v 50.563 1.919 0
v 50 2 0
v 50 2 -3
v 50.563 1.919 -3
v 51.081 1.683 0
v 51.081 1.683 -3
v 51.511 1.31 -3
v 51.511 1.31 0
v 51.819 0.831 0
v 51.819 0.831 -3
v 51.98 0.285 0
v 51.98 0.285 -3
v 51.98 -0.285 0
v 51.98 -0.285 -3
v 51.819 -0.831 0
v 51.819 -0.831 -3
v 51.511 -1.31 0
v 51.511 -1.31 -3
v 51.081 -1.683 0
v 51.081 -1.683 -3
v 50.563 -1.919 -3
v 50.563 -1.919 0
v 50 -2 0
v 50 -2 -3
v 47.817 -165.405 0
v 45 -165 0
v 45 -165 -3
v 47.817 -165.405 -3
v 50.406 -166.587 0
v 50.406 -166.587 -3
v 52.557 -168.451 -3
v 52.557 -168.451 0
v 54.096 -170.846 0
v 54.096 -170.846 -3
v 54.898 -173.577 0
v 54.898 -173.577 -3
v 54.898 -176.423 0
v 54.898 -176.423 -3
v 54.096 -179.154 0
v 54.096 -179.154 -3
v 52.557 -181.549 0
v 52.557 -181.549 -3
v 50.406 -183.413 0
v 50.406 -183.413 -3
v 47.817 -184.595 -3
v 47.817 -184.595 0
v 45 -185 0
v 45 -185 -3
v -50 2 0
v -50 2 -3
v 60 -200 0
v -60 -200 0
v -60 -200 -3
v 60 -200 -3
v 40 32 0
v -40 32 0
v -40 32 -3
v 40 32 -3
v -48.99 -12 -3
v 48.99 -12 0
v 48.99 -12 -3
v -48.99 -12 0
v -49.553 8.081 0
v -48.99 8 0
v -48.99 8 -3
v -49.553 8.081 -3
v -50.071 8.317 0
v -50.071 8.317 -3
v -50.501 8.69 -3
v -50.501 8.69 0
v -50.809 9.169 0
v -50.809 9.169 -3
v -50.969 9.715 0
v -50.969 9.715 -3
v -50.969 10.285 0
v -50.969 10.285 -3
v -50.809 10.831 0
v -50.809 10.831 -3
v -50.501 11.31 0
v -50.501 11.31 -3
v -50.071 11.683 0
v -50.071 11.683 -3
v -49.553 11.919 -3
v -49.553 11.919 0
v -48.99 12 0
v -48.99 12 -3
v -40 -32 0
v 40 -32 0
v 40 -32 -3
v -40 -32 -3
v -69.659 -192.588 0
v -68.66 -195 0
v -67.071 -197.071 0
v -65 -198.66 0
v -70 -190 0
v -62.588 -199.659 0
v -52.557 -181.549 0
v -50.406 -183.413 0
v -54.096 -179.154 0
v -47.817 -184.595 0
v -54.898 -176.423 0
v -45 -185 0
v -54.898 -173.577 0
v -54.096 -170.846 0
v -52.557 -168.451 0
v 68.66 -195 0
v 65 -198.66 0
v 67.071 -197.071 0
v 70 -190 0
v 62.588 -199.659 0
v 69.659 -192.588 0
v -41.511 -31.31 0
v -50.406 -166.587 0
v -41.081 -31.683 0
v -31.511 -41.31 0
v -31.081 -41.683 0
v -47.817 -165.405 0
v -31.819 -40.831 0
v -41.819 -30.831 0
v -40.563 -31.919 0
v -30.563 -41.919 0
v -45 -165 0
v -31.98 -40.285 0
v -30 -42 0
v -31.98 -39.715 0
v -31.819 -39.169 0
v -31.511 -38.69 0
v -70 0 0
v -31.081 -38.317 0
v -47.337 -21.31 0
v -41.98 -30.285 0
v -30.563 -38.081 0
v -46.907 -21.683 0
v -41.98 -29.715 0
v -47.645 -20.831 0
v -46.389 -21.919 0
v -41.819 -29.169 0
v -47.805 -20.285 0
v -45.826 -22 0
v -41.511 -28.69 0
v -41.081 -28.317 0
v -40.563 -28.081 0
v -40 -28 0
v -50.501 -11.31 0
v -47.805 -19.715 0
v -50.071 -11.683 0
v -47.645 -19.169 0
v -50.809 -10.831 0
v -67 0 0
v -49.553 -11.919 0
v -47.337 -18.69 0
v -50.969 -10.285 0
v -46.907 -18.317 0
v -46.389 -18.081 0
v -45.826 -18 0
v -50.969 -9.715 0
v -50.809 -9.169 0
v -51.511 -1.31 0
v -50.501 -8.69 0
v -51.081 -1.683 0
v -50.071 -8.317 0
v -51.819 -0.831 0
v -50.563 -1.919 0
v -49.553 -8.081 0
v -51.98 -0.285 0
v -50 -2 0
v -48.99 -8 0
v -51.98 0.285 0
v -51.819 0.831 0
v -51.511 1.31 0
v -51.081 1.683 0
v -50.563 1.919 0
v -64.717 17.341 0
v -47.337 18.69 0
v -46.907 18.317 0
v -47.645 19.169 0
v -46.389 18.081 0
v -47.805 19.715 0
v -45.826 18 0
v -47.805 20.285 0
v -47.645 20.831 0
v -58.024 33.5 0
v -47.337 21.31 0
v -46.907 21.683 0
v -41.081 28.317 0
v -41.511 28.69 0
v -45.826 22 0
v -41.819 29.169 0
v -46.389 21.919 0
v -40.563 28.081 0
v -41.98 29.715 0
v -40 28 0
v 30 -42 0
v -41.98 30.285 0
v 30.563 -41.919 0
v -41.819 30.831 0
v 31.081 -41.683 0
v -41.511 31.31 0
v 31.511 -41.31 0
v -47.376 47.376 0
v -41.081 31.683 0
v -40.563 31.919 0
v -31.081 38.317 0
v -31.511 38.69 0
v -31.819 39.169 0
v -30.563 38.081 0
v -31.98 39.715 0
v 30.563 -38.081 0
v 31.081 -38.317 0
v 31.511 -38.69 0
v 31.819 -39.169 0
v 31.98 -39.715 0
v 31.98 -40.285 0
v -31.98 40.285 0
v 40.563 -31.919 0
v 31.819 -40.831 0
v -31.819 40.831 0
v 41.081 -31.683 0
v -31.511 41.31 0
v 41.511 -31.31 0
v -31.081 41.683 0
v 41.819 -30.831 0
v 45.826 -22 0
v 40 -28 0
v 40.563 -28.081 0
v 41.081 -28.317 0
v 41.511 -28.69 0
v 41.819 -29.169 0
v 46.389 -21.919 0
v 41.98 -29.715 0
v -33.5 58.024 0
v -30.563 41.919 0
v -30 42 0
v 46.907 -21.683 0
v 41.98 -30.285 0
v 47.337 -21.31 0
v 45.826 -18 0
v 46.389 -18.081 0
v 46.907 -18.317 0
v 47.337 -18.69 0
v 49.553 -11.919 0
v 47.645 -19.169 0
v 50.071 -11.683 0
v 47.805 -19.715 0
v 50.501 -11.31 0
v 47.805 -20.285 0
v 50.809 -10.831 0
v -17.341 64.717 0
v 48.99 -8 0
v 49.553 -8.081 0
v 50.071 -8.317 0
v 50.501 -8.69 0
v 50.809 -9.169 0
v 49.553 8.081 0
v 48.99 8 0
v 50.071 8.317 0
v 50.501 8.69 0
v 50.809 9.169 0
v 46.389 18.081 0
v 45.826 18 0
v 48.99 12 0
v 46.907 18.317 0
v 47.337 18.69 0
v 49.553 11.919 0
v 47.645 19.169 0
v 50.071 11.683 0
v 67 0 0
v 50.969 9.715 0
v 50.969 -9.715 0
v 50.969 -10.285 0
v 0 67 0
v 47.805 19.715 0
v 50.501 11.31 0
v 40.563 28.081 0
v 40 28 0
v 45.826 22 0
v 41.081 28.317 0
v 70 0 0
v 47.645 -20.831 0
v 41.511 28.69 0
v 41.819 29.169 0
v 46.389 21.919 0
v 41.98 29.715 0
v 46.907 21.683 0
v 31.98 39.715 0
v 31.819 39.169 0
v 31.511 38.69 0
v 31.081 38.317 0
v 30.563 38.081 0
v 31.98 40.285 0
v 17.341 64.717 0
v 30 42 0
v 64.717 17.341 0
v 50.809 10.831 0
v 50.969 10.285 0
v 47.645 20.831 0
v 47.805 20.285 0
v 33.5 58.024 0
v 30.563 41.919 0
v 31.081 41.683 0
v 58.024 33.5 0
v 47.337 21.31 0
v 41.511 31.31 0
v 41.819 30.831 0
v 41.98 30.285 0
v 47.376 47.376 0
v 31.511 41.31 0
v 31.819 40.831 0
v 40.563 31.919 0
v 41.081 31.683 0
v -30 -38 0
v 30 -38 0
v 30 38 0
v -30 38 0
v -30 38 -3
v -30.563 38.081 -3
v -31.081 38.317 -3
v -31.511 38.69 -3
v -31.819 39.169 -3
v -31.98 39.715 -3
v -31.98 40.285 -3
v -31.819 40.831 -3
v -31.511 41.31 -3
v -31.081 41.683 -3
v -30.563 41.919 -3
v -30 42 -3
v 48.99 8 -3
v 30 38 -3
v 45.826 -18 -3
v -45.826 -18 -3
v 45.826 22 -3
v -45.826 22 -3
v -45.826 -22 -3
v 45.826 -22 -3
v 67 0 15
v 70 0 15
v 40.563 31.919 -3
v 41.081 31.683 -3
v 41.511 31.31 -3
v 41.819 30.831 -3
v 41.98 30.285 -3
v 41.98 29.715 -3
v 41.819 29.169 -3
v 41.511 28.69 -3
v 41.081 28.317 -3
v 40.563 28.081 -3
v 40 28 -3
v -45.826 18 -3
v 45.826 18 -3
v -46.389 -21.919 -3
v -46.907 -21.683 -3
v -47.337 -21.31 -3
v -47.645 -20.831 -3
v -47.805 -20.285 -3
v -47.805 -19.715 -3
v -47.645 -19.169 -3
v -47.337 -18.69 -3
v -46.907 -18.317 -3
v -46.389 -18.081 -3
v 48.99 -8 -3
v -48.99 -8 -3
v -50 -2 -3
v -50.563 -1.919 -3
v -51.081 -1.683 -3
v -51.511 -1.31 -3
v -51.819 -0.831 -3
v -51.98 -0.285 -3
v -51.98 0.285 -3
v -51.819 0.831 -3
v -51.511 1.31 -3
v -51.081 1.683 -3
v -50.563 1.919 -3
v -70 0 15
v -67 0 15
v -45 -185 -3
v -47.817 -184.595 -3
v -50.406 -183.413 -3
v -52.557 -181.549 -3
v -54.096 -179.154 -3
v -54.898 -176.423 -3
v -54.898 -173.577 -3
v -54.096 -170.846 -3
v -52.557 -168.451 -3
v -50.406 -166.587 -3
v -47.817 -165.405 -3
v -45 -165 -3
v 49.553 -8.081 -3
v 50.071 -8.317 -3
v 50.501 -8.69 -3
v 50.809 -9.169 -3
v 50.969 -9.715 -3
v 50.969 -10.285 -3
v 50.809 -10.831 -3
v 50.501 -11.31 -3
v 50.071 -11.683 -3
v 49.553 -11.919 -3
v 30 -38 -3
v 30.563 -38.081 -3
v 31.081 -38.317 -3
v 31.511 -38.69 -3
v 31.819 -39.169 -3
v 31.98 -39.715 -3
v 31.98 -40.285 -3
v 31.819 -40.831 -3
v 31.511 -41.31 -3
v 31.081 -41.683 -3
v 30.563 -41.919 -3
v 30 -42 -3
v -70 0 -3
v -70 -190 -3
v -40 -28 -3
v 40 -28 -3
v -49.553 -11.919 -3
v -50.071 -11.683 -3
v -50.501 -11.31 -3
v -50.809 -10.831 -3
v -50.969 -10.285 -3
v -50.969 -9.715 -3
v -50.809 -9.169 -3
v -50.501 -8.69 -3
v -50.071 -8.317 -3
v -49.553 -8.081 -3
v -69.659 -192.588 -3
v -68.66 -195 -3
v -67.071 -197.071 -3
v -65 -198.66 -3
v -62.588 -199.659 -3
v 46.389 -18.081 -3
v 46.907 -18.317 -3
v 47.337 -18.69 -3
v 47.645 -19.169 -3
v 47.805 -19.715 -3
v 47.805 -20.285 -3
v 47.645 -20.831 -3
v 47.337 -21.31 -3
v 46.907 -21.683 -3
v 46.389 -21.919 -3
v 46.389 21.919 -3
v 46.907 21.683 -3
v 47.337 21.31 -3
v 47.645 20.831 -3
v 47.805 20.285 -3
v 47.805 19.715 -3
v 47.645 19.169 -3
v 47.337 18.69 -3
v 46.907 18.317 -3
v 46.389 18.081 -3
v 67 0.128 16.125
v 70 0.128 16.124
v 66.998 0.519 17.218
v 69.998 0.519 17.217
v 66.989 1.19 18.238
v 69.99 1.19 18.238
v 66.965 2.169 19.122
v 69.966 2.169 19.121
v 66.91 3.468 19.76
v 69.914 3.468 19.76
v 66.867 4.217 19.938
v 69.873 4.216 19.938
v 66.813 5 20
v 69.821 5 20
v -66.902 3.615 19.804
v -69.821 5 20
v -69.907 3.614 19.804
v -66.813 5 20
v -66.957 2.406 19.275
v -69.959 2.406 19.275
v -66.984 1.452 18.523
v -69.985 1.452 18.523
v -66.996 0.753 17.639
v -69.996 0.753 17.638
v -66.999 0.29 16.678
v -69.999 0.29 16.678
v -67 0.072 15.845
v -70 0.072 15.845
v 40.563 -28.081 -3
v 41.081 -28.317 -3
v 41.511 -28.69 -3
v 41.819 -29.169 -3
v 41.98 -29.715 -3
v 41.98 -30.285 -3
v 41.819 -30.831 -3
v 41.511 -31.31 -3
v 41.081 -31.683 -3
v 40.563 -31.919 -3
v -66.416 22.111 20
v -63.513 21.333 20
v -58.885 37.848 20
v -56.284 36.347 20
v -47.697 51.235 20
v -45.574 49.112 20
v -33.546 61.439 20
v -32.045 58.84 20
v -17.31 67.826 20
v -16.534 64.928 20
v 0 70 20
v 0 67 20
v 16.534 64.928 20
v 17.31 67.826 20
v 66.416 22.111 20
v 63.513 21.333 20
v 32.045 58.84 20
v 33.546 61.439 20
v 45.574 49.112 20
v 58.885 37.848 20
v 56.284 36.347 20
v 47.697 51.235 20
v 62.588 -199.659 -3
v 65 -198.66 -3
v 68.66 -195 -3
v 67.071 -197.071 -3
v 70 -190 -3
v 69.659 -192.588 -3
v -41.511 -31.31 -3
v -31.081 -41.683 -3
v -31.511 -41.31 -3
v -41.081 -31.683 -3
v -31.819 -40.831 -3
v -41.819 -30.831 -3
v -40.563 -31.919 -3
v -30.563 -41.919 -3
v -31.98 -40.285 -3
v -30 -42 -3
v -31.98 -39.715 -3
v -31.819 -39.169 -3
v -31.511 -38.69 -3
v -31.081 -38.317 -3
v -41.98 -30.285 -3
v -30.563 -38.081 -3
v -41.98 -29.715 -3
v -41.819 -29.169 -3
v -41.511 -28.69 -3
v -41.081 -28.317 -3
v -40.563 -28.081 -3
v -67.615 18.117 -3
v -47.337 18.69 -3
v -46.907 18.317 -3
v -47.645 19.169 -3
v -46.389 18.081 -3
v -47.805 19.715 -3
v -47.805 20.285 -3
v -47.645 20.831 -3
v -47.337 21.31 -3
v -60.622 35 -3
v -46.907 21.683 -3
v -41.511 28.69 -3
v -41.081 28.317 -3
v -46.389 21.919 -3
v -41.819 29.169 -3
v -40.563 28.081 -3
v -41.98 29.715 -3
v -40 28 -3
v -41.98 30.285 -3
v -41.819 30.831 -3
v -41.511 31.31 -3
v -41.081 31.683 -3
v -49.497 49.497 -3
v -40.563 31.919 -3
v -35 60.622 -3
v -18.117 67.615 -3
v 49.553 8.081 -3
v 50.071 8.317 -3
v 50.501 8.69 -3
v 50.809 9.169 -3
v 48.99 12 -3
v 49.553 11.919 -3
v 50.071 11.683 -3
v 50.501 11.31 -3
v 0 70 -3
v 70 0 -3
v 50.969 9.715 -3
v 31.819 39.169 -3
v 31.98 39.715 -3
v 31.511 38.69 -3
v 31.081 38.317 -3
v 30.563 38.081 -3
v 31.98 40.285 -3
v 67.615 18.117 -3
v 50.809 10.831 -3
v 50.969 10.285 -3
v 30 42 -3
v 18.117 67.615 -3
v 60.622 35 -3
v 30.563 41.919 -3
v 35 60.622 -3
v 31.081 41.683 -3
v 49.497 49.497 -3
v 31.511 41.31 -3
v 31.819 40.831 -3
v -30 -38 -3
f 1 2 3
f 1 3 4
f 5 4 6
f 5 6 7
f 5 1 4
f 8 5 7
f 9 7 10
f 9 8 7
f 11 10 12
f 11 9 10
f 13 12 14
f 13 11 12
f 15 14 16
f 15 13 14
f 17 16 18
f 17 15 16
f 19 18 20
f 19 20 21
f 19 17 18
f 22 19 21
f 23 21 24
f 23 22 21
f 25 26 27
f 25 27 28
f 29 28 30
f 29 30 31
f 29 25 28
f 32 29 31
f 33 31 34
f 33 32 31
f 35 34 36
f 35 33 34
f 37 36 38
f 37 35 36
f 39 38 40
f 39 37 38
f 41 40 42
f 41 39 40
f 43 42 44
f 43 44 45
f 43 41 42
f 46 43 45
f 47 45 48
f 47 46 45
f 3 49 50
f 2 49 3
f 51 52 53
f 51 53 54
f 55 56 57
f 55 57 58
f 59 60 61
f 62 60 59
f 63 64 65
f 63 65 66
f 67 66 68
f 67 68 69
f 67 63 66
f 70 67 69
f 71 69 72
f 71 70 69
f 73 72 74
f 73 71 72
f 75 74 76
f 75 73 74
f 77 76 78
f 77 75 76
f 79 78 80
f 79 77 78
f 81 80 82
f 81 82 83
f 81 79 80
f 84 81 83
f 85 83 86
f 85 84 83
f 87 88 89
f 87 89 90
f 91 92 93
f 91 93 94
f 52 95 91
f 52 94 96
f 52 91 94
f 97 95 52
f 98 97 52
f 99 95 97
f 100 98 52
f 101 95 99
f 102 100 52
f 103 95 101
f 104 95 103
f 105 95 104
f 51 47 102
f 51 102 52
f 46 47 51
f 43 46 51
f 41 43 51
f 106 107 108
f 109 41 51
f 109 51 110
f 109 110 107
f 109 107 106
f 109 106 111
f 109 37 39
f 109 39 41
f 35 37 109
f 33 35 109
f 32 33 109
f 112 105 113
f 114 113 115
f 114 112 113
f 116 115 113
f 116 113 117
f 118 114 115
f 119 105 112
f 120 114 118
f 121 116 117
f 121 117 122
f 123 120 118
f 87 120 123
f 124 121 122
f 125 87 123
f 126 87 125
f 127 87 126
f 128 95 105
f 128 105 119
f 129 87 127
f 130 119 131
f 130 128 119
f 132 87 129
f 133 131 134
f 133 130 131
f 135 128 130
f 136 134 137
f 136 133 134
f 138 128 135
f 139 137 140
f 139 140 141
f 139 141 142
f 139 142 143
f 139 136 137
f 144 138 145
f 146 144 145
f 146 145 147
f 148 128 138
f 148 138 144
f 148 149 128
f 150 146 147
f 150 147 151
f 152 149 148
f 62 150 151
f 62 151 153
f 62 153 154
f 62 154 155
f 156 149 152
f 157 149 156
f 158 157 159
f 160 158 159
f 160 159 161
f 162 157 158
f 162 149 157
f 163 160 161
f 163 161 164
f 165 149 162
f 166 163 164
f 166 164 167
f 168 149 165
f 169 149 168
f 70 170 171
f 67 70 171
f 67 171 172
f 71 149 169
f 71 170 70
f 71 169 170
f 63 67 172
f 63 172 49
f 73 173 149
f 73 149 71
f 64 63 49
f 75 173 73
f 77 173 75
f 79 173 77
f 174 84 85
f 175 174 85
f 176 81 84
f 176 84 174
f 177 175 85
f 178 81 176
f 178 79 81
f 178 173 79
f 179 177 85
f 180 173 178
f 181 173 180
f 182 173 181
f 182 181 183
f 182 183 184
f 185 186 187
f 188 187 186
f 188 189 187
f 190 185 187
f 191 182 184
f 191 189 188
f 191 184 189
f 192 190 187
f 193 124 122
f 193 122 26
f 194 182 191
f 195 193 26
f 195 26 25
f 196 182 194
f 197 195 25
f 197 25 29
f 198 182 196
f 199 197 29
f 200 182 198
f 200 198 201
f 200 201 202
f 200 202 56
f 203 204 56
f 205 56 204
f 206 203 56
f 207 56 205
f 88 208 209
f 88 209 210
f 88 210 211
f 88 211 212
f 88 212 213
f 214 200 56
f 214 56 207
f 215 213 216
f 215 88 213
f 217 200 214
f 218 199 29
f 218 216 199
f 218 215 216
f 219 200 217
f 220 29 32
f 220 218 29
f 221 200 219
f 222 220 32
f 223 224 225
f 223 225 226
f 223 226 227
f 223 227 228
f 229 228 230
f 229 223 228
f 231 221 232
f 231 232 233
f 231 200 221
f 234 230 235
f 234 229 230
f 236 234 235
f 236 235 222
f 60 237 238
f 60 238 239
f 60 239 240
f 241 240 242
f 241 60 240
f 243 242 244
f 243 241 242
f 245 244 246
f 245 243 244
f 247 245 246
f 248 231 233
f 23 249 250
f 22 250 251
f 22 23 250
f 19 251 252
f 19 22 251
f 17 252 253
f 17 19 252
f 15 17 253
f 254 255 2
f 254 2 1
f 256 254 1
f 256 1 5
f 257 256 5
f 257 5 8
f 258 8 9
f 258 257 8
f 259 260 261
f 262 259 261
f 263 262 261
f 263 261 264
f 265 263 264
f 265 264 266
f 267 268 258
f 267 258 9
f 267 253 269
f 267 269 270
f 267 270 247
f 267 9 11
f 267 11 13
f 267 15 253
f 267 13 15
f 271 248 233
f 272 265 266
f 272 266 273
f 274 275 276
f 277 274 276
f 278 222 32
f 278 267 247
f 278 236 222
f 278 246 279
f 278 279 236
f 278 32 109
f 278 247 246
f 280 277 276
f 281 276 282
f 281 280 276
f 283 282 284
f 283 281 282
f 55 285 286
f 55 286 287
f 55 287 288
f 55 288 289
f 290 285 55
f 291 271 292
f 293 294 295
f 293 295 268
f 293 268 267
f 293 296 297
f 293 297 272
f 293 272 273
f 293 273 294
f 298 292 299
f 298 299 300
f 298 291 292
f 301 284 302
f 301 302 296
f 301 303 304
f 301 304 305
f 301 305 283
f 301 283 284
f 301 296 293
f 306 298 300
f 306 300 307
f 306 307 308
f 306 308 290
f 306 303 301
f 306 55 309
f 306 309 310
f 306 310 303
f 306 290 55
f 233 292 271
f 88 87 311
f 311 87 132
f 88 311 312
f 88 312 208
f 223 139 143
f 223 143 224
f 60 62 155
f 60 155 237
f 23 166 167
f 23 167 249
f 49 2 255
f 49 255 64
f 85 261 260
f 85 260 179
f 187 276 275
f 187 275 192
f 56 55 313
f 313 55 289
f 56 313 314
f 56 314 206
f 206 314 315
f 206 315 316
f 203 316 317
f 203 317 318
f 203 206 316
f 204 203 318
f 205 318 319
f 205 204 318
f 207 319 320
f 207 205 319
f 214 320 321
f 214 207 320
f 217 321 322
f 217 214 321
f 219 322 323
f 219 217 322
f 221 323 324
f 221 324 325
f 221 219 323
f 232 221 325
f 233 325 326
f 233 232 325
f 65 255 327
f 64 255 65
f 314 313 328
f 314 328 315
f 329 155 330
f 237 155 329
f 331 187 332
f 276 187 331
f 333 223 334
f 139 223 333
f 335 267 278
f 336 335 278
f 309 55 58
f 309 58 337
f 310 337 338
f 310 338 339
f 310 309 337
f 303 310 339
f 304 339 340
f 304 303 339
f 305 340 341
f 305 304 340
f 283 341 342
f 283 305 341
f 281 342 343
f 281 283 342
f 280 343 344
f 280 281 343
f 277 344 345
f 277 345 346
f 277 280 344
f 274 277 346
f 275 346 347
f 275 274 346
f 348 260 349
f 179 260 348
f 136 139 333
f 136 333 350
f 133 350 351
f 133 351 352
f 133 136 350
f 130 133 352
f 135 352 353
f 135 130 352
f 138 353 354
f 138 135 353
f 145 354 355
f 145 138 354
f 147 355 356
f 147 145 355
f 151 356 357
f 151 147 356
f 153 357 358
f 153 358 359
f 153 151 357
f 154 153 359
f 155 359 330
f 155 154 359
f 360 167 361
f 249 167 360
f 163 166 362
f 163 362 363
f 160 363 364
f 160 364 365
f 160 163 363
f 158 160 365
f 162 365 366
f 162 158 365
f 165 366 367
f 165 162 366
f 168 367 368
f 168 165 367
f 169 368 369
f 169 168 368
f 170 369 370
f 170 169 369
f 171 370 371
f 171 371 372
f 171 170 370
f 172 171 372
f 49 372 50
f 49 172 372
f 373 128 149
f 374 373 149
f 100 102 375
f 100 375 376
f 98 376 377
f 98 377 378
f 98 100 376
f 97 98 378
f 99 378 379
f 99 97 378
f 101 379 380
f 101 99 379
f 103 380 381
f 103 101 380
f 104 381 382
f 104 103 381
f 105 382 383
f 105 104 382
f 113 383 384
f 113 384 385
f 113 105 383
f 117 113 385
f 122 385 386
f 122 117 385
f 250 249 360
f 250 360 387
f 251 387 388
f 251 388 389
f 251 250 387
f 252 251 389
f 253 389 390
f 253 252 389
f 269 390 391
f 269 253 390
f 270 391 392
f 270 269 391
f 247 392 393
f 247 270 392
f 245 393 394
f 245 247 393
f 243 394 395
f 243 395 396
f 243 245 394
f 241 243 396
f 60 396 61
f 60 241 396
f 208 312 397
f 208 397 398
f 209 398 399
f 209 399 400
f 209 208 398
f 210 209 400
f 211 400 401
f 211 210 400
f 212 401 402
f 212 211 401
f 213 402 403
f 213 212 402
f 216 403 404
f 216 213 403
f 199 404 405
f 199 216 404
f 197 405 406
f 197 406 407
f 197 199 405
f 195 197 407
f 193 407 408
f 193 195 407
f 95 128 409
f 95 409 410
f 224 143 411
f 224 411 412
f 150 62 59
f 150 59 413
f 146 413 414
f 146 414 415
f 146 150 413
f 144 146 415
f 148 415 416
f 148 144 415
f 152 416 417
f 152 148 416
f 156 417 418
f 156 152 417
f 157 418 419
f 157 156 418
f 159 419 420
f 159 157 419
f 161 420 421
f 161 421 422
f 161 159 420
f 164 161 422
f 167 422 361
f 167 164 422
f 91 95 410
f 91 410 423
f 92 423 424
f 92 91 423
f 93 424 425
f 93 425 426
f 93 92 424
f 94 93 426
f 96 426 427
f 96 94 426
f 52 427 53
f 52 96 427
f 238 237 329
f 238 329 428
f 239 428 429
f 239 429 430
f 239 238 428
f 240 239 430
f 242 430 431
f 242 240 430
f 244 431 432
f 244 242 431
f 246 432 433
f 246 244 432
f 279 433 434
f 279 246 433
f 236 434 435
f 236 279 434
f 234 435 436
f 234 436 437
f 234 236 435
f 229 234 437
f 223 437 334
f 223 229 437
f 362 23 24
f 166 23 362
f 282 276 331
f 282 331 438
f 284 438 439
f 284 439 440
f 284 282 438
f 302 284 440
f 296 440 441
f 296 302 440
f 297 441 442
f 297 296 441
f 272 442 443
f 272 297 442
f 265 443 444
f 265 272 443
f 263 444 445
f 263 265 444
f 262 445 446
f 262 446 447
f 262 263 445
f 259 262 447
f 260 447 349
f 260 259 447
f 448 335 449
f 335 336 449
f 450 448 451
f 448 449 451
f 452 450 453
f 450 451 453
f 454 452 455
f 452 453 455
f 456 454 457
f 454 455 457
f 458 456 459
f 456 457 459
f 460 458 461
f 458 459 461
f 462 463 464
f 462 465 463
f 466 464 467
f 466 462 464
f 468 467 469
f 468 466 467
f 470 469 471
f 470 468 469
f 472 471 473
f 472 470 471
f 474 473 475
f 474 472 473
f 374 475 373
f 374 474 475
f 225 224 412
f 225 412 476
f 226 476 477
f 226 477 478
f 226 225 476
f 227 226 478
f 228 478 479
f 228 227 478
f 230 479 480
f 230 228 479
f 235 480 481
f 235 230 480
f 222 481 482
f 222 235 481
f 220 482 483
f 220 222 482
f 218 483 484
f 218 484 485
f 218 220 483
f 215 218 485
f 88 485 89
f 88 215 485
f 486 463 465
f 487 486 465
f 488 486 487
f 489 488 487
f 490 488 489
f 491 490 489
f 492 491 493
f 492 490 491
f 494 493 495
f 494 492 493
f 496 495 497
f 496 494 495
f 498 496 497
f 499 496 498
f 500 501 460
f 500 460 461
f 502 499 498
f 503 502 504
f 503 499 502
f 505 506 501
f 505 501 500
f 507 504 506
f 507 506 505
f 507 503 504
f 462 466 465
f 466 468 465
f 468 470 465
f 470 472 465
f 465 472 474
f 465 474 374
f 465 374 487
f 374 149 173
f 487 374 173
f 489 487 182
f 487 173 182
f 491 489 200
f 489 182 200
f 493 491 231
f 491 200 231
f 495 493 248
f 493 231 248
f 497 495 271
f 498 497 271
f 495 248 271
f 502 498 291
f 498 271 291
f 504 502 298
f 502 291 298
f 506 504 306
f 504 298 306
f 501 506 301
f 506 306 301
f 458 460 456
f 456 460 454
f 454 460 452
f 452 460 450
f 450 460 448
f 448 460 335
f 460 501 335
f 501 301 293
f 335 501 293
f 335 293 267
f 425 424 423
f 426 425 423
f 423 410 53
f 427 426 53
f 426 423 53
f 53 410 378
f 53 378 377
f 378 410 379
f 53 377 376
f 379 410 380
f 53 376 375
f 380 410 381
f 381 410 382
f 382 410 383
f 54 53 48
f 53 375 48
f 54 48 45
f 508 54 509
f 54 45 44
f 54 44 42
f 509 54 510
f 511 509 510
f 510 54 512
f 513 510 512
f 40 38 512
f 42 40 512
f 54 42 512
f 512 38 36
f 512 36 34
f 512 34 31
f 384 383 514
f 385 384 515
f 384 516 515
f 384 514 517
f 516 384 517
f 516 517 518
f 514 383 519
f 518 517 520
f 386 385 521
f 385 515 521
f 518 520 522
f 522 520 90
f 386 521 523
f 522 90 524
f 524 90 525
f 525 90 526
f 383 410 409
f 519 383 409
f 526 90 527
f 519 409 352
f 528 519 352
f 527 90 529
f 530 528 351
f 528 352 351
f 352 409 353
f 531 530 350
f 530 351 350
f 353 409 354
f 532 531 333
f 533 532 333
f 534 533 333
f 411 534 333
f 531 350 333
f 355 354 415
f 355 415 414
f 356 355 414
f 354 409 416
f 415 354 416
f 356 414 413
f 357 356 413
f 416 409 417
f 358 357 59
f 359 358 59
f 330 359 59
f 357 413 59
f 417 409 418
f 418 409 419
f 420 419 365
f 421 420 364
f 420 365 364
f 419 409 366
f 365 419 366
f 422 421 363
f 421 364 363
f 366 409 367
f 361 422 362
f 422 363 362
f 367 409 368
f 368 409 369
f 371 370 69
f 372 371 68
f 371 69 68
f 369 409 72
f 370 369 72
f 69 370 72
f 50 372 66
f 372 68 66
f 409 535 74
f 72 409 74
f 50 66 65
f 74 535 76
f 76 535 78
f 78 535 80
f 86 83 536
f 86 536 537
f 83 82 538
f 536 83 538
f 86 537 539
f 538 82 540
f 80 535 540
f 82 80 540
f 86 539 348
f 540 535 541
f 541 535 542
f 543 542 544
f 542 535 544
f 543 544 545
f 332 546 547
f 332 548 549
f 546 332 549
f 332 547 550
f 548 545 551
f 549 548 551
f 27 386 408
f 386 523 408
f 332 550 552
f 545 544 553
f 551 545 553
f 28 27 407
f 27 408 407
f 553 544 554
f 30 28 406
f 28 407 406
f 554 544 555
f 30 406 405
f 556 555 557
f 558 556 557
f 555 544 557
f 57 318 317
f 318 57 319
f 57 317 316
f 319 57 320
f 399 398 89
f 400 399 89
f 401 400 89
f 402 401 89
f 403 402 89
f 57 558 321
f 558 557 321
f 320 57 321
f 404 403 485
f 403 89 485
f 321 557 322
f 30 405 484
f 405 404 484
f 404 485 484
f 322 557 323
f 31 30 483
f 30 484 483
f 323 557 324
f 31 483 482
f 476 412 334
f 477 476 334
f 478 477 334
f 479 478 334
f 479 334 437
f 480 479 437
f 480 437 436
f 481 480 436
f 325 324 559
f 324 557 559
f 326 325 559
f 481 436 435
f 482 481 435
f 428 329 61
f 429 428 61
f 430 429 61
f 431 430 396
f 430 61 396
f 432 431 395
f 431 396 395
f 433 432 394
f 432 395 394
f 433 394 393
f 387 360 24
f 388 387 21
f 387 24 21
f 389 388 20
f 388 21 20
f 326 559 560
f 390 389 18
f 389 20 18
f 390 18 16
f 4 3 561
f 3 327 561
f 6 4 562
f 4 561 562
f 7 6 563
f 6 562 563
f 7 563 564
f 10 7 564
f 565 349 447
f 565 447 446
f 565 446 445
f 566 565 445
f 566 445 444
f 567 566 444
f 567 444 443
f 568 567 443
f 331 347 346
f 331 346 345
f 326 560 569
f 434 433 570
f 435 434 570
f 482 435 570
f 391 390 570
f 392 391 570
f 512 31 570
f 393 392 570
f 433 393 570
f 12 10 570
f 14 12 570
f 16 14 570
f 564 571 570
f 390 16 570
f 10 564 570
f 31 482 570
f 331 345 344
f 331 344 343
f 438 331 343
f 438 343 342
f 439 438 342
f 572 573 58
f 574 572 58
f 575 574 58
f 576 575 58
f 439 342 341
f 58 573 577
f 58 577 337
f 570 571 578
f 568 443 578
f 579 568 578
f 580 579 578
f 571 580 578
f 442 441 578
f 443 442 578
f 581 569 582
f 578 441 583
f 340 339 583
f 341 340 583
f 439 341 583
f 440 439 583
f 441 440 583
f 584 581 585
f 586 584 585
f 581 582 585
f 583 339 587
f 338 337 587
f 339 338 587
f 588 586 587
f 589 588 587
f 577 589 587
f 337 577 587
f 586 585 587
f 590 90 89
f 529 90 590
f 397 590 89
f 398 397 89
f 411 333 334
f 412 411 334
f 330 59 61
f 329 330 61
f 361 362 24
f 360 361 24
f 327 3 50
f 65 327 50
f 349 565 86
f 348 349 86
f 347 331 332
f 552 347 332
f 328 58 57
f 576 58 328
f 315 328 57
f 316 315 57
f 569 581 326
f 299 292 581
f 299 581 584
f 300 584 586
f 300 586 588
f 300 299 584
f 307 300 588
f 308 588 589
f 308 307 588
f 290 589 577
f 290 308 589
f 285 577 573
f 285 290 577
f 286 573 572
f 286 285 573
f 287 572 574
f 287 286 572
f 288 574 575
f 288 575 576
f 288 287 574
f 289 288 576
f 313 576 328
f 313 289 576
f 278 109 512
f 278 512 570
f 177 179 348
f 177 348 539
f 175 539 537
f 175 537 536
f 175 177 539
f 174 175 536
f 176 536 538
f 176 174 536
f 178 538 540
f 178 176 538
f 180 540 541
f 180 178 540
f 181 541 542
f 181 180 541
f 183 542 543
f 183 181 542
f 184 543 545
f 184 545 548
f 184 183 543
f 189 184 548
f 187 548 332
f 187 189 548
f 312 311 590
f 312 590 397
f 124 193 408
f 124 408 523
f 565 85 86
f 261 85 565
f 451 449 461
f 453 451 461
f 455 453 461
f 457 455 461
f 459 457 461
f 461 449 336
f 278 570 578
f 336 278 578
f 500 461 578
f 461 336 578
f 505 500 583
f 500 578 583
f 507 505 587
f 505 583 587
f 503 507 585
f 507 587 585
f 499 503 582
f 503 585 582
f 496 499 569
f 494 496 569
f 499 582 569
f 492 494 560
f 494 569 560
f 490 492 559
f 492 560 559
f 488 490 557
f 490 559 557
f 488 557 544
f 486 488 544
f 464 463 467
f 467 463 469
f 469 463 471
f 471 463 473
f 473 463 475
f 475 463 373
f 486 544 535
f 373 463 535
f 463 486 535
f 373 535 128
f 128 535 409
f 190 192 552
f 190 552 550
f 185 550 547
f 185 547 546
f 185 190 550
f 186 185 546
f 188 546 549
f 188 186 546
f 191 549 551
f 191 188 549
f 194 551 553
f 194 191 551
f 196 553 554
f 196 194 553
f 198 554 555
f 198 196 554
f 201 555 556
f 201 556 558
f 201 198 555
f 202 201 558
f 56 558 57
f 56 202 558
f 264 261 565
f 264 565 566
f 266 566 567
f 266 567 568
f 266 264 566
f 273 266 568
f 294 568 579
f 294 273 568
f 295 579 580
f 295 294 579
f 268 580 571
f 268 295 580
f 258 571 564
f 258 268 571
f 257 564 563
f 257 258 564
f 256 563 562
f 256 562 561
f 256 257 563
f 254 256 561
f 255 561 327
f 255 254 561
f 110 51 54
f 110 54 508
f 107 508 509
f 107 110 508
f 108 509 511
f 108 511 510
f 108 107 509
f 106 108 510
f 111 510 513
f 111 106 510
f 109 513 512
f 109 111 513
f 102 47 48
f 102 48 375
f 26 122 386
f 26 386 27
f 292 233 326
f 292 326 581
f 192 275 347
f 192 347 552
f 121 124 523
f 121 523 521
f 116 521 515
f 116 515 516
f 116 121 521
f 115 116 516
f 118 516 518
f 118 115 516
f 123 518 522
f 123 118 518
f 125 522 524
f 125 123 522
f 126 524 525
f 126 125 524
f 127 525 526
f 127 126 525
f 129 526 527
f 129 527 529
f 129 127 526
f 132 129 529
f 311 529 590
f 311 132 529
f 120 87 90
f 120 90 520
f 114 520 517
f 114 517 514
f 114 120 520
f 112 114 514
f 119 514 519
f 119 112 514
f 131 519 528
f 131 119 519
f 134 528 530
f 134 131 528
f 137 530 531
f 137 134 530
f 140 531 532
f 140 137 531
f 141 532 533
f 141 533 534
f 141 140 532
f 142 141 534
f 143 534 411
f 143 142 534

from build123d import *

# Parameters (mm, degrees)
F1_DEPTH = 3
F2_DEPTH = 20
F3_R     = 5


with BuildPart() as f1:
    # F0 (on Top) → F1 (new body)
    with BuildSketch(Plane.XY):
        with BuildLine():
            Line((70, -190), (70, 0))
            Line((70, 0), (67, 0))
            ThreePointArc((67, 0), (0, 67), (-67, 0))
            Line((-67, 0), (-70, 0))
            Line((-70, 0), (-70, -190))
            ThreePointArc((-70, -190), (-67.071068, -197.071068), (-60, -200))
            Line((-60, -200), (60, -200))
            ThreePointArc((60, -200), (67.071068, -197.071068), (70, -190))
        make_face()
        with BuildLine():
            Line((45, -185), (-45, -185))
            ThreePointArc((-45, -185), (-55, -175), (-45, -165))
            Line((-45, -165), (45, -165))
            ThreePointArc((45, -165), (55, -175), (45, -185))
        make_face(mode=Mode.SUBTRACT)
        with BuildLine():
            ThreePointArc((30, -38), (32, -40), (30, -42))
            Line((30, -42), (-30, -42))
            ThreePointArc((-30, -42), (-32, -40), (-30, -38))
            Line((-30, -38), (30, -38))
        make_face(mode=Mode.SUBTRACT)
        with BuildLine():
            ThreePointArc((-40, -32), (-42, -30), (-40, -28))
            Line((-40, -28), (40, -28))
            ThreePointArc((40, -28), (42, -30), (40, -32))
            Line((40, -32), (-40, -32))
        make_face(mode=Mode.SUBTRACT)
        with BuildLine():
            ThreePointArc((45.825757, -18), (47.825757, -20), (45.825757, -22))
            Line((45.825757, -22), (-45.825757, -22))
            ThreePointArc((-45.825757, -22), (-47.825757, -20), (-45.825757, -18))
            Line((-45.825757, -18), (45.825757, -18))
        make_face(mode=Mode.SUBTRACT)
        with BuildLine():
            ThreePointArc((-48.989795, -12), (-50.989795, -10), (-48.989795, -8))
            Line((-48.989795, -8), (48.989795, -8))
            ThreePointArc((48.989795, -8), (50.989795, -10), (48.989795, -12))
            Line((48.989795, -12), (-48.989795, -12))
        make_face(mode=Mode.SUBTRACT)
        with BuildLine():
            Line((50, -2), (-50, -2))
            ThreePointArc((-50, -2), (-52, 0), (-50, 2))
            Line((-50, 2), (50, 2))
            ThreePointArc((50, 2), (52, 0), (50, -2))
        make_face(mode=Mode.SUBTRACT)
        with BuildLine():
            Line((48.989795, 8), (-48.989795, 8))
            ThreePointArc((-48.989795, 8), (-50.989795, 10), (-48.989795, 12))
            Line((-48.989795, 12), (48.989795, 12))
            ThreePointArc((48.989795, 12), (50.989795, 10), (48.989795, 8))
        make_face(mode=Mode.SUBTRACT)
        with BuildLine():
            Line((45.825757, 18), (-45.825757, 18))
            ThreePointArc((-45.825757, 18), (-47.825757, 20), (-45.825757, 22))
            Line((-45.825757, 22), (45.825757, 22))
            ThreePointArc((45.825757, 22), (47.825757, 20), (45.825757, 18))
        make_face(mode=Mode.SUBTRACT)
        with BuildLine():
            Line((40, 28), (-40, 28))
            ThreePointArc((-40, 28), (-42, 30), (-40, 32))
            Line((-40, 32), (40, 32))
            ThreePointArc((40, 32), (42, 30), (40, 28))
        make_face(mode=Mode.SUBTRACT)
        with BuildLine():
            Line((30, 38), (-30, 38))
            ThreePointArc((-30, 38), (-32, 40), (-30, 42))
            Line((-30, 42), (30, 42))
            ThreePointArc((30, 42), (32, 40), (30, 38))
        make_face(mode=Mode.SUBTRACT)
        with BuildLine():
            Line((67, 0), (70, 0))
            ThreePointArc((70, 0), (0, 70), (-70, 0))
            Line((-70, 0), (-67, 0))
            ThreePointArc((-67, 0), (0, 67), (67, 0))
        make_face()
    extrude(amount=-F1_DEPTH)

    # F0 (on Top) → F2 (join)
    with BuildSketch(Plane.XY):
        with BuildLine():
            Line((67, 0), (70, 0))
            ThreePointArc((70, 0), (0, 70), (-70, 0))
            Line((-70, 0), (-67, 0))
            ThreePointArc((-67, 0), (0, 67), (67, 0))
        make_face()
    extrude(amount=F2_DEPTH)

    # F3
    f3_edges = [f1.edges().sort_by_distance(p)[0] for p in [
        (-68.5, 0, 20),
        (68.5, 0, 20),
    ]]
    fillet(f3_edges, radius=F3_R)


solid = f1.part
